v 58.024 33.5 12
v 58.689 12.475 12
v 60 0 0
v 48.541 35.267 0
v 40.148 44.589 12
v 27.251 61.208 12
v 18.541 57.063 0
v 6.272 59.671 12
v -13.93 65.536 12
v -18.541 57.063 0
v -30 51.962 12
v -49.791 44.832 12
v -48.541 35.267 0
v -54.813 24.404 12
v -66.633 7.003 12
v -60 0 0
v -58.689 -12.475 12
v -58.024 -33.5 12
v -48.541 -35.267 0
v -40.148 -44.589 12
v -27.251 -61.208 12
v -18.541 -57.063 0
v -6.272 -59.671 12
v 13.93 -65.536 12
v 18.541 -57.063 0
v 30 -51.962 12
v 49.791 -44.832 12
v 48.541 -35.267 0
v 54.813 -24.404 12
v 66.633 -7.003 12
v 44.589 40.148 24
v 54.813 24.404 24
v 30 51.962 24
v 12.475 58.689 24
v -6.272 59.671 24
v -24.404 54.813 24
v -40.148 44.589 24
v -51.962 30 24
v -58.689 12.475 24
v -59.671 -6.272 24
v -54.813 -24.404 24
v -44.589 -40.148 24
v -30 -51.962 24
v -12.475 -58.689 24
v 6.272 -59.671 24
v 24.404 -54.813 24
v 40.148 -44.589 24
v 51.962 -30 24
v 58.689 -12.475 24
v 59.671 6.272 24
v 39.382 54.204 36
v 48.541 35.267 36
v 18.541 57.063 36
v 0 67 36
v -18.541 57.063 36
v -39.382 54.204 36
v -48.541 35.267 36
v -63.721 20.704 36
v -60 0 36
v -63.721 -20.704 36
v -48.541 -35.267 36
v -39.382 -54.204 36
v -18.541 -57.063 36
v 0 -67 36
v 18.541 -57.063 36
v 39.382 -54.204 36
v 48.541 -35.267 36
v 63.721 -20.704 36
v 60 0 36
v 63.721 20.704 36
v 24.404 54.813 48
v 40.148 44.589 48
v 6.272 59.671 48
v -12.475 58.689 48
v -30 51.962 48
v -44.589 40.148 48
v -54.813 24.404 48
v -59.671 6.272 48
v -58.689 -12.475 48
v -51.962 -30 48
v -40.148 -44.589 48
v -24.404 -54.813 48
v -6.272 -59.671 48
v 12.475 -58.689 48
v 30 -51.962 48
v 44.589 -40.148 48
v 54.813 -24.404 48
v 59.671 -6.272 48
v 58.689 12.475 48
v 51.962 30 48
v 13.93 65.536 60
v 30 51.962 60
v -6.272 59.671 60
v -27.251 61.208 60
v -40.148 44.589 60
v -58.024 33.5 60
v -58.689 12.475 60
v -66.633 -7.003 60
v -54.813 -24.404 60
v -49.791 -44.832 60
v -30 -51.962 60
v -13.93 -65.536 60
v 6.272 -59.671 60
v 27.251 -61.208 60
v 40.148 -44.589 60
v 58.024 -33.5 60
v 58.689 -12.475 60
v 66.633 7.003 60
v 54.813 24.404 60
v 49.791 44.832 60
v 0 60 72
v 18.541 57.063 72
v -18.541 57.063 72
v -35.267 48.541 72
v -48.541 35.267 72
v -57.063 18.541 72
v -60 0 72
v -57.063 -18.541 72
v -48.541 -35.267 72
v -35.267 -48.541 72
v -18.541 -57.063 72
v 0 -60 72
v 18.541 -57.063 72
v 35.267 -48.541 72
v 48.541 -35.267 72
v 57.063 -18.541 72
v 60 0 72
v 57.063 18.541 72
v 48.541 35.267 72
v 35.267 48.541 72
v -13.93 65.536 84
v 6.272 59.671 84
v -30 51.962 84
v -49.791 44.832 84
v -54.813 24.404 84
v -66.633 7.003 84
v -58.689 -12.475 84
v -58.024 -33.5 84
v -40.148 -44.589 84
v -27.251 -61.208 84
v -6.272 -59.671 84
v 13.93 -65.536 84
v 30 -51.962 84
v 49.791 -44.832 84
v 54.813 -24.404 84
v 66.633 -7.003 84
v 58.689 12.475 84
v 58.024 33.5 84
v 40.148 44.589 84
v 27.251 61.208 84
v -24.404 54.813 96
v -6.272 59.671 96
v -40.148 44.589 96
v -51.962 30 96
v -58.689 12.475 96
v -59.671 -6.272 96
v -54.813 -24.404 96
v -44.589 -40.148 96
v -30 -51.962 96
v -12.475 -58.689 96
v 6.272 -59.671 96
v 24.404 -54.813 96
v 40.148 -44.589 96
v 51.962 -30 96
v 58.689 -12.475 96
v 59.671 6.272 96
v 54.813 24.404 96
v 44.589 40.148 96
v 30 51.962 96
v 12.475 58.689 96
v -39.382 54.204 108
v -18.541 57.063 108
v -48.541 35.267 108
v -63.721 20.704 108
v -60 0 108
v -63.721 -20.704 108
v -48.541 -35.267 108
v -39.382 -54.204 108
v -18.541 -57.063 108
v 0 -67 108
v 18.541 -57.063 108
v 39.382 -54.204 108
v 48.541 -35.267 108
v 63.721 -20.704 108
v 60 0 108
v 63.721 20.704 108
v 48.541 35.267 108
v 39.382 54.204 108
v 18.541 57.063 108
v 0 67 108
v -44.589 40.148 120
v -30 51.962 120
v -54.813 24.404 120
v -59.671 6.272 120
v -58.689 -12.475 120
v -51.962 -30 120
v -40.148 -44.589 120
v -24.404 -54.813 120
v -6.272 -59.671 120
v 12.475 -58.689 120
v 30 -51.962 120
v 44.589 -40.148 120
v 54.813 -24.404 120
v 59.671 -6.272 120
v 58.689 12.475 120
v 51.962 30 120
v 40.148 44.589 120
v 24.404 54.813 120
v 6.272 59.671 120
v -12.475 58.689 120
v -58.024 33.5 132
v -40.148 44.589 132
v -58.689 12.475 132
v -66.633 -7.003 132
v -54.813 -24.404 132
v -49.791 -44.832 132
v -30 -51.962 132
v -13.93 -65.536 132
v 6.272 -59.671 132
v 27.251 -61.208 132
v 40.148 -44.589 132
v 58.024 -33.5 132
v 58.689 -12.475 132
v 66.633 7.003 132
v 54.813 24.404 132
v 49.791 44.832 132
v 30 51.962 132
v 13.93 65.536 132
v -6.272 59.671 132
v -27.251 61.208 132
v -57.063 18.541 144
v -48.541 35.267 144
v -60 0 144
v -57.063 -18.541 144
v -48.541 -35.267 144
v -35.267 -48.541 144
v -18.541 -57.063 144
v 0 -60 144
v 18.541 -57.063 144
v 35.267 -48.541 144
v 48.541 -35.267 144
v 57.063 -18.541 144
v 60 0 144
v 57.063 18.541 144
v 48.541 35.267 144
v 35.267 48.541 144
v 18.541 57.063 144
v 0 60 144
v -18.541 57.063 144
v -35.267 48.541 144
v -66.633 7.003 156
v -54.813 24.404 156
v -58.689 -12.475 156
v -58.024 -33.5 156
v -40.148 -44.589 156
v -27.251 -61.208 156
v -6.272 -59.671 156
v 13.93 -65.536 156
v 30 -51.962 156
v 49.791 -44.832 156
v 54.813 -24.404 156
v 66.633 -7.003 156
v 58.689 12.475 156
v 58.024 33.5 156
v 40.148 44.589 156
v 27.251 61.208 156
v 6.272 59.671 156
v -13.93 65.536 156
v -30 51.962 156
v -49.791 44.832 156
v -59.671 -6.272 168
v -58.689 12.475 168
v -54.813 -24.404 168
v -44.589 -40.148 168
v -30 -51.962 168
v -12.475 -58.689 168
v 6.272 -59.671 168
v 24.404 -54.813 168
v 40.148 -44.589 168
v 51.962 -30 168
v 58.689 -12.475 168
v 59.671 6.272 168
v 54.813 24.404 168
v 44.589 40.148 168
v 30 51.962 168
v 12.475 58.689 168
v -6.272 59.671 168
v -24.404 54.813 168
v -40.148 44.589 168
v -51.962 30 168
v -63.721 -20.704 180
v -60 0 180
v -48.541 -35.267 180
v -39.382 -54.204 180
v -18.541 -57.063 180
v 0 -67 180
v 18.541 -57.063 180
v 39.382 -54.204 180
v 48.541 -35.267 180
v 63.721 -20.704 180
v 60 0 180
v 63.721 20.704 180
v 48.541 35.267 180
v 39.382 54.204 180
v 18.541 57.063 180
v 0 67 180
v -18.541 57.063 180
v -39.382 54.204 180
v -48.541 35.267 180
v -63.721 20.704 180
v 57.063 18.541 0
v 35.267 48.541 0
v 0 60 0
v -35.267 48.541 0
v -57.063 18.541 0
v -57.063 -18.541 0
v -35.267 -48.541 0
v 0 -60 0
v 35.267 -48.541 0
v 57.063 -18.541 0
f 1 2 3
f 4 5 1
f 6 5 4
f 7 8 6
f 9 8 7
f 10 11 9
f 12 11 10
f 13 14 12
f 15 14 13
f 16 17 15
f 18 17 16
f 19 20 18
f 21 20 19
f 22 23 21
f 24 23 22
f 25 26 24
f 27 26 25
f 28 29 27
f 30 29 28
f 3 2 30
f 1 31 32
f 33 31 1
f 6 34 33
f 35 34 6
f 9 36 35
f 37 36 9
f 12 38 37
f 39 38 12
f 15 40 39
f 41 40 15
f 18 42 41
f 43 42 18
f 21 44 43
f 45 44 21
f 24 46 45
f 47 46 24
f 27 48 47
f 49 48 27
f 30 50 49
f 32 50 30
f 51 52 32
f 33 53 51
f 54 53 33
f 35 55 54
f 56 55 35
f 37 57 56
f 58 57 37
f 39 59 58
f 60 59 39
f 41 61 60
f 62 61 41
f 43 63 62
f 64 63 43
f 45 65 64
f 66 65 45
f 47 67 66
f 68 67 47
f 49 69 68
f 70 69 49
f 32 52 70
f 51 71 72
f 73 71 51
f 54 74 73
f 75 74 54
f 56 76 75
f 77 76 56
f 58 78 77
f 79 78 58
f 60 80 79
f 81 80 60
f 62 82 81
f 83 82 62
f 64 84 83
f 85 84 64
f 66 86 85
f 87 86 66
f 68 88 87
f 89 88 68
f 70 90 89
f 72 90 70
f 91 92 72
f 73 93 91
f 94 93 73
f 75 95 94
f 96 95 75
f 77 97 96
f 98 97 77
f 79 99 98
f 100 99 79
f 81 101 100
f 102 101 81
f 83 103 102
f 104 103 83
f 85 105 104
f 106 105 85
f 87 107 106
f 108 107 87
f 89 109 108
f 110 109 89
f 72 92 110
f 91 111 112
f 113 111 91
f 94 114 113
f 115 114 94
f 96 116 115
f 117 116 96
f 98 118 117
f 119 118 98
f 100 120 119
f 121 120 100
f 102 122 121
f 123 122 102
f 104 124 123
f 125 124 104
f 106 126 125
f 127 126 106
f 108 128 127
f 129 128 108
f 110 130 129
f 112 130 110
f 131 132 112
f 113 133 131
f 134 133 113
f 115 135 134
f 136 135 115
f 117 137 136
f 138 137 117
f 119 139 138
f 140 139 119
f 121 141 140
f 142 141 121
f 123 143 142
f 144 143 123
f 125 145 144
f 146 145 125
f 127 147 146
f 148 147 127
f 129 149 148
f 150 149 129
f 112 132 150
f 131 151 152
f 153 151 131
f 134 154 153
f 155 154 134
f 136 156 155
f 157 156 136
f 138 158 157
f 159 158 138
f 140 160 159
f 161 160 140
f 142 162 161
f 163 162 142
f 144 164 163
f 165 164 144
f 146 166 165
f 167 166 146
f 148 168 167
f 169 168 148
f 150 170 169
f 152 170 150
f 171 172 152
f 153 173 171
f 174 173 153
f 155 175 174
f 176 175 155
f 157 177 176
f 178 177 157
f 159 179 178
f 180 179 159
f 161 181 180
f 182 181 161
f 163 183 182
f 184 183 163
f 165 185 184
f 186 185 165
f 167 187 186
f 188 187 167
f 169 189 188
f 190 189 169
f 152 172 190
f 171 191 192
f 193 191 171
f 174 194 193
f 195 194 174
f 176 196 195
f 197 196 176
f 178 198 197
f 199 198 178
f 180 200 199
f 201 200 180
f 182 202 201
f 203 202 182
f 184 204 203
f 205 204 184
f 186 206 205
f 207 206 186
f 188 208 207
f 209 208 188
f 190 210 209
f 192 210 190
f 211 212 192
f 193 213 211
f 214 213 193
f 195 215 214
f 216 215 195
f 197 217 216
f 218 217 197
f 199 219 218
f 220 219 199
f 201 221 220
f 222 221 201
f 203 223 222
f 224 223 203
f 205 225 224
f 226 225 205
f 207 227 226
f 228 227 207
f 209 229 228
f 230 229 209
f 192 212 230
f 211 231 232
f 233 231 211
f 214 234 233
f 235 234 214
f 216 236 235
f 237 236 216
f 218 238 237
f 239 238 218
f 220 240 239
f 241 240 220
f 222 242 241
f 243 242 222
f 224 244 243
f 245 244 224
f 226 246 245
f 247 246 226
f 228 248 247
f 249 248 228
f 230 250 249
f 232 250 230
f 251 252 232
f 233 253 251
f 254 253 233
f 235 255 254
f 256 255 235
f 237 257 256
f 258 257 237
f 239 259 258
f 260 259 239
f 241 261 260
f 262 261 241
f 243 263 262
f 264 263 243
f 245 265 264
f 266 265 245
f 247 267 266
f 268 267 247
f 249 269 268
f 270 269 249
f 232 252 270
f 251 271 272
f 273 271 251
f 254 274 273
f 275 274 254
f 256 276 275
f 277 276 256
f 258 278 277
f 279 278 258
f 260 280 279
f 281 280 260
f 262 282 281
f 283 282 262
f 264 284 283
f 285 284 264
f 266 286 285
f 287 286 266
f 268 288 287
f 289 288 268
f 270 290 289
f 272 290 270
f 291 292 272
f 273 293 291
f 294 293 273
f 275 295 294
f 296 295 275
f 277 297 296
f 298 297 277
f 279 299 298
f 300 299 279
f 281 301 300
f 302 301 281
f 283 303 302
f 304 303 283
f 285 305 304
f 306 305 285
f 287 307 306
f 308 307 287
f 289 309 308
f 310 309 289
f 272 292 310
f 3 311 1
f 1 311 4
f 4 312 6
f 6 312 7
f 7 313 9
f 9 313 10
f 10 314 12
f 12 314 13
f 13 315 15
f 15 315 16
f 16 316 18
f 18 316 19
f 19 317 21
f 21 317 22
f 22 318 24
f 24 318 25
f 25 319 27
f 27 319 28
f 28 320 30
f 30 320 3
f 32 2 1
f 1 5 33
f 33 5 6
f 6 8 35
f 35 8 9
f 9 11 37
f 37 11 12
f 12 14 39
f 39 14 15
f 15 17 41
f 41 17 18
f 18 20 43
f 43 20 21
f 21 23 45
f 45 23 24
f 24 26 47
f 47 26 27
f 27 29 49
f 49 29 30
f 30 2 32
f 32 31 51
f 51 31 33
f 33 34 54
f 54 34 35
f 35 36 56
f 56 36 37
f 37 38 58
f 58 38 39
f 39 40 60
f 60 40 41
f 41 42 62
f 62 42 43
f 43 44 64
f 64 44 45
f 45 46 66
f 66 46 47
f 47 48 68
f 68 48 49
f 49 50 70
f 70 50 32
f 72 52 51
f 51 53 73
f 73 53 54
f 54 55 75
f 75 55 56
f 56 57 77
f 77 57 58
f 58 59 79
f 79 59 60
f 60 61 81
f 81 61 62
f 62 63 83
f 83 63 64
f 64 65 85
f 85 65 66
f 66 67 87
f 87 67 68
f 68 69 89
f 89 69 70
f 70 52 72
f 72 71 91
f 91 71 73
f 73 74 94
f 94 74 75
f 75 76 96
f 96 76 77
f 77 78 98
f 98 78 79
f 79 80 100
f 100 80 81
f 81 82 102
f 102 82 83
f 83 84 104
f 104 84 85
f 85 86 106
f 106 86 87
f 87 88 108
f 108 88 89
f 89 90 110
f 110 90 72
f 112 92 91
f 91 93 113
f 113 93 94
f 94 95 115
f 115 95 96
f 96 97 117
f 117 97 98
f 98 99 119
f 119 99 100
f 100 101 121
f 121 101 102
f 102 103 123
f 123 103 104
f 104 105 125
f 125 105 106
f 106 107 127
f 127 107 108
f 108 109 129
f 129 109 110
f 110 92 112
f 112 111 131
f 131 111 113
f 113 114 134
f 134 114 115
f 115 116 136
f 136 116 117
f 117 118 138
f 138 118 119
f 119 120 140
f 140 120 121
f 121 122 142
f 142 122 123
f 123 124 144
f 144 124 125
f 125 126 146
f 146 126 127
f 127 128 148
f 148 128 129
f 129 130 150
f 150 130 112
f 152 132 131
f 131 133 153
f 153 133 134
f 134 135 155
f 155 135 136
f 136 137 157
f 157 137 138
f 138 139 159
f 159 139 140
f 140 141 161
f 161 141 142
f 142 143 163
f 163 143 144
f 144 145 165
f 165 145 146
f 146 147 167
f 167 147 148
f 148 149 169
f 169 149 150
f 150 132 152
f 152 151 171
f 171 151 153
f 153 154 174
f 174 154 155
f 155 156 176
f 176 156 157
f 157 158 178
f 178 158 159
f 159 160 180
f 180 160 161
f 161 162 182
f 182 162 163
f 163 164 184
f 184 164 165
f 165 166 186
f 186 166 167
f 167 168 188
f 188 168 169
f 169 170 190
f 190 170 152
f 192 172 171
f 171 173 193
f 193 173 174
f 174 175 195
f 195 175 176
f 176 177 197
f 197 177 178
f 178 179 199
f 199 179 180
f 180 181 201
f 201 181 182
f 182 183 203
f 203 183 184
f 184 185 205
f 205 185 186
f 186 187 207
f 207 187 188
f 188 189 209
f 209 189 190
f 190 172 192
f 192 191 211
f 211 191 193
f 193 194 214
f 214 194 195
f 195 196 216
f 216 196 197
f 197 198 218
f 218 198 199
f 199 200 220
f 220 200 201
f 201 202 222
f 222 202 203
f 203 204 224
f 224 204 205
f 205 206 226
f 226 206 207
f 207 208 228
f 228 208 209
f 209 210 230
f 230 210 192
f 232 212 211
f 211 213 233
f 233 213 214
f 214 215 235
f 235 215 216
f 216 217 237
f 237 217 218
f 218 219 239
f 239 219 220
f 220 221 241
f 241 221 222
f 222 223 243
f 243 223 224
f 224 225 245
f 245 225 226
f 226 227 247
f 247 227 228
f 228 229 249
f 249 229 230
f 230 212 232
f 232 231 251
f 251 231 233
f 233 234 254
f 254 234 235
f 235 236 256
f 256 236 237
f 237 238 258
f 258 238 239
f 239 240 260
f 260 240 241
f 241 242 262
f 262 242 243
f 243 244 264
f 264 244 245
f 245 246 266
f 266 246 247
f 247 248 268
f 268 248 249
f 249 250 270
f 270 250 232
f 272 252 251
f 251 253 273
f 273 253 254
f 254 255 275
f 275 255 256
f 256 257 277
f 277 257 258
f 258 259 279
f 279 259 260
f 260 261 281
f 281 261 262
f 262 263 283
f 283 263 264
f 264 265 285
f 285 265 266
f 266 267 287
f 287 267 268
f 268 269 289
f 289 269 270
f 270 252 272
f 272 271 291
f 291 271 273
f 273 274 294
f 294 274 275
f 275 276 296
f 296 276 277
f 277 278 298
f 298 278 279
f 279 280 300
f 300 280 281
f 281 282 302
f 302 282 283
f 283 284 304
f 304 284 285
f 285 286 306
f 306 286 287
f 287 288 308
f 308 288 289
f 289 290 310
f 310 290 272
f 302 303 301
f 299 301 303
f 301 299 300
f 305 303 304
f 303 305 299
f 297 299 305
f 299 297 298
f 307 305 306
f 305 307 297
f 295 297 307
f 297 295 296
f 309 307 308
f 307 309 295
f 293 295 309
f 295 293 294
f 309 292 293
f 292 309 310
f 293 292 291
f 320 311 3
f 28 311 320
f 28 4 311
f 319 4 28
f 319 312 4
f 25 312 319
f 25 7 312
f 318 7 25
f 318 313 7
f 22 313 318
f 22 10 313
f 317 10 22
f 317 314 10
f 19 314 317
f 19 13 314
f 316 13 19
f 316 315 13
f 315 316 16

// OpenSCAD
/*

LOW POLY VASE FACTORY

Fernando Jerez 2017
License: CC


*/

// Style / Shape
shape = "cylinder"; // [cylinder: Cylinder, vase1:Vase, vase2:Vase 2, glass: Glass, bowl:Bowl, cup1: Cup, cup2: Cup 2, cone: Cone ]

// Radius 
radius= 60; // [20:100]

// Spike size
spikes = 7; //[-20:20]

// Number of Sides
sides = 20; // [3:30]

// Number of Levels
levels = 15; // [3:30]

// Twisting factor
twist = 1; //[-1:0.1:1]

/* [Hidden] */

vase();

module vase(){

altura = 180 - 180%levels; // z-steps
step = floor(180/levels); // resolution in Z (1 is the best and slower)

 
stepc = 360/sides; // Don't touch!

puntos = [
    for(z = [0:step:altura])
        for(i = [0:stepc:359])
            let(

                
                // shape 
                zrad  = (shape=="cylinder") ? 1 :
                        (shape=="vase1")    ? 0.7+ 0.4*sin(z*1.9) :
                        (shape=="vase2")    ? 0.6+ 0.4*pow(sin(z+60),2) :
                        (shape=="glass")    ? 0.6+ 0.4*pow(sin(z*0.7-30),2) :
                        (shape=="cup1")      ? 0.65+ 0.3 * cos(z*2+35) :
                        (shape=="cup2")     ? 0.6+ 0.35*cos(180 - z+50)*sin(180-z*2.5+45) :
                        (shape=="bowl")     ? 0.6+ 0.4 * sin(z*0.5) :
                        cos(z*0.5),
        
                rad2  = ((z/step)%2==1 && (i/stepc)%2==1)?spikes:0,
                g = z*twist,
                
                // vertex
                r     = rad2+  zrad* radius, 
                px    = r*cos(i+g),
                py    = r*sin(i+g)
        
            )
        
            [px,py,z]
];
        
caras = concat(
    [
    for(z = [0:(altura/step)-1])
        for(s = [0:sides-1])
            let(
                // clockwise from left-down corner
                f1 = s + sides*z,
                f2 = s + sides*(z+1),
                f3 = ((s+1) % sides) + sides*(z+1),
                f4 = ((s+1) % sides) + sides*z
            )
        
            ( (s+z)%2==0) ? [f1,f2,f3] : [f2,f3,f4]
 
    ],
    [
    for(z = [0:(altura/step)-1])
        for(s = [0:sides-1])
            let(
                // clockwise from left-down corner
                f1 = s + sides*z,
                f2 = s + sides*(z+1),
                f3 = ((s+1) % sides) + sides*(z+1),
                f4 = ((s+1) % sides) + sides*z
            )
            ( (s+z)%2==0) ? [f3,f4,f1] : [f4,f1,f2]
         
    ],
   
    (shape!="cone")?[[ for(s = [sides-1:-1:0]) (altura/step)*(sides) + s]]:[], //top
    [[ for(s = [0:sides-1]) s]] //bottom
        
 );       
 scale([1,1,(shape=="bowl")?0.33:1])    
 polyhedron (points=puntos,faces = caras);

}
